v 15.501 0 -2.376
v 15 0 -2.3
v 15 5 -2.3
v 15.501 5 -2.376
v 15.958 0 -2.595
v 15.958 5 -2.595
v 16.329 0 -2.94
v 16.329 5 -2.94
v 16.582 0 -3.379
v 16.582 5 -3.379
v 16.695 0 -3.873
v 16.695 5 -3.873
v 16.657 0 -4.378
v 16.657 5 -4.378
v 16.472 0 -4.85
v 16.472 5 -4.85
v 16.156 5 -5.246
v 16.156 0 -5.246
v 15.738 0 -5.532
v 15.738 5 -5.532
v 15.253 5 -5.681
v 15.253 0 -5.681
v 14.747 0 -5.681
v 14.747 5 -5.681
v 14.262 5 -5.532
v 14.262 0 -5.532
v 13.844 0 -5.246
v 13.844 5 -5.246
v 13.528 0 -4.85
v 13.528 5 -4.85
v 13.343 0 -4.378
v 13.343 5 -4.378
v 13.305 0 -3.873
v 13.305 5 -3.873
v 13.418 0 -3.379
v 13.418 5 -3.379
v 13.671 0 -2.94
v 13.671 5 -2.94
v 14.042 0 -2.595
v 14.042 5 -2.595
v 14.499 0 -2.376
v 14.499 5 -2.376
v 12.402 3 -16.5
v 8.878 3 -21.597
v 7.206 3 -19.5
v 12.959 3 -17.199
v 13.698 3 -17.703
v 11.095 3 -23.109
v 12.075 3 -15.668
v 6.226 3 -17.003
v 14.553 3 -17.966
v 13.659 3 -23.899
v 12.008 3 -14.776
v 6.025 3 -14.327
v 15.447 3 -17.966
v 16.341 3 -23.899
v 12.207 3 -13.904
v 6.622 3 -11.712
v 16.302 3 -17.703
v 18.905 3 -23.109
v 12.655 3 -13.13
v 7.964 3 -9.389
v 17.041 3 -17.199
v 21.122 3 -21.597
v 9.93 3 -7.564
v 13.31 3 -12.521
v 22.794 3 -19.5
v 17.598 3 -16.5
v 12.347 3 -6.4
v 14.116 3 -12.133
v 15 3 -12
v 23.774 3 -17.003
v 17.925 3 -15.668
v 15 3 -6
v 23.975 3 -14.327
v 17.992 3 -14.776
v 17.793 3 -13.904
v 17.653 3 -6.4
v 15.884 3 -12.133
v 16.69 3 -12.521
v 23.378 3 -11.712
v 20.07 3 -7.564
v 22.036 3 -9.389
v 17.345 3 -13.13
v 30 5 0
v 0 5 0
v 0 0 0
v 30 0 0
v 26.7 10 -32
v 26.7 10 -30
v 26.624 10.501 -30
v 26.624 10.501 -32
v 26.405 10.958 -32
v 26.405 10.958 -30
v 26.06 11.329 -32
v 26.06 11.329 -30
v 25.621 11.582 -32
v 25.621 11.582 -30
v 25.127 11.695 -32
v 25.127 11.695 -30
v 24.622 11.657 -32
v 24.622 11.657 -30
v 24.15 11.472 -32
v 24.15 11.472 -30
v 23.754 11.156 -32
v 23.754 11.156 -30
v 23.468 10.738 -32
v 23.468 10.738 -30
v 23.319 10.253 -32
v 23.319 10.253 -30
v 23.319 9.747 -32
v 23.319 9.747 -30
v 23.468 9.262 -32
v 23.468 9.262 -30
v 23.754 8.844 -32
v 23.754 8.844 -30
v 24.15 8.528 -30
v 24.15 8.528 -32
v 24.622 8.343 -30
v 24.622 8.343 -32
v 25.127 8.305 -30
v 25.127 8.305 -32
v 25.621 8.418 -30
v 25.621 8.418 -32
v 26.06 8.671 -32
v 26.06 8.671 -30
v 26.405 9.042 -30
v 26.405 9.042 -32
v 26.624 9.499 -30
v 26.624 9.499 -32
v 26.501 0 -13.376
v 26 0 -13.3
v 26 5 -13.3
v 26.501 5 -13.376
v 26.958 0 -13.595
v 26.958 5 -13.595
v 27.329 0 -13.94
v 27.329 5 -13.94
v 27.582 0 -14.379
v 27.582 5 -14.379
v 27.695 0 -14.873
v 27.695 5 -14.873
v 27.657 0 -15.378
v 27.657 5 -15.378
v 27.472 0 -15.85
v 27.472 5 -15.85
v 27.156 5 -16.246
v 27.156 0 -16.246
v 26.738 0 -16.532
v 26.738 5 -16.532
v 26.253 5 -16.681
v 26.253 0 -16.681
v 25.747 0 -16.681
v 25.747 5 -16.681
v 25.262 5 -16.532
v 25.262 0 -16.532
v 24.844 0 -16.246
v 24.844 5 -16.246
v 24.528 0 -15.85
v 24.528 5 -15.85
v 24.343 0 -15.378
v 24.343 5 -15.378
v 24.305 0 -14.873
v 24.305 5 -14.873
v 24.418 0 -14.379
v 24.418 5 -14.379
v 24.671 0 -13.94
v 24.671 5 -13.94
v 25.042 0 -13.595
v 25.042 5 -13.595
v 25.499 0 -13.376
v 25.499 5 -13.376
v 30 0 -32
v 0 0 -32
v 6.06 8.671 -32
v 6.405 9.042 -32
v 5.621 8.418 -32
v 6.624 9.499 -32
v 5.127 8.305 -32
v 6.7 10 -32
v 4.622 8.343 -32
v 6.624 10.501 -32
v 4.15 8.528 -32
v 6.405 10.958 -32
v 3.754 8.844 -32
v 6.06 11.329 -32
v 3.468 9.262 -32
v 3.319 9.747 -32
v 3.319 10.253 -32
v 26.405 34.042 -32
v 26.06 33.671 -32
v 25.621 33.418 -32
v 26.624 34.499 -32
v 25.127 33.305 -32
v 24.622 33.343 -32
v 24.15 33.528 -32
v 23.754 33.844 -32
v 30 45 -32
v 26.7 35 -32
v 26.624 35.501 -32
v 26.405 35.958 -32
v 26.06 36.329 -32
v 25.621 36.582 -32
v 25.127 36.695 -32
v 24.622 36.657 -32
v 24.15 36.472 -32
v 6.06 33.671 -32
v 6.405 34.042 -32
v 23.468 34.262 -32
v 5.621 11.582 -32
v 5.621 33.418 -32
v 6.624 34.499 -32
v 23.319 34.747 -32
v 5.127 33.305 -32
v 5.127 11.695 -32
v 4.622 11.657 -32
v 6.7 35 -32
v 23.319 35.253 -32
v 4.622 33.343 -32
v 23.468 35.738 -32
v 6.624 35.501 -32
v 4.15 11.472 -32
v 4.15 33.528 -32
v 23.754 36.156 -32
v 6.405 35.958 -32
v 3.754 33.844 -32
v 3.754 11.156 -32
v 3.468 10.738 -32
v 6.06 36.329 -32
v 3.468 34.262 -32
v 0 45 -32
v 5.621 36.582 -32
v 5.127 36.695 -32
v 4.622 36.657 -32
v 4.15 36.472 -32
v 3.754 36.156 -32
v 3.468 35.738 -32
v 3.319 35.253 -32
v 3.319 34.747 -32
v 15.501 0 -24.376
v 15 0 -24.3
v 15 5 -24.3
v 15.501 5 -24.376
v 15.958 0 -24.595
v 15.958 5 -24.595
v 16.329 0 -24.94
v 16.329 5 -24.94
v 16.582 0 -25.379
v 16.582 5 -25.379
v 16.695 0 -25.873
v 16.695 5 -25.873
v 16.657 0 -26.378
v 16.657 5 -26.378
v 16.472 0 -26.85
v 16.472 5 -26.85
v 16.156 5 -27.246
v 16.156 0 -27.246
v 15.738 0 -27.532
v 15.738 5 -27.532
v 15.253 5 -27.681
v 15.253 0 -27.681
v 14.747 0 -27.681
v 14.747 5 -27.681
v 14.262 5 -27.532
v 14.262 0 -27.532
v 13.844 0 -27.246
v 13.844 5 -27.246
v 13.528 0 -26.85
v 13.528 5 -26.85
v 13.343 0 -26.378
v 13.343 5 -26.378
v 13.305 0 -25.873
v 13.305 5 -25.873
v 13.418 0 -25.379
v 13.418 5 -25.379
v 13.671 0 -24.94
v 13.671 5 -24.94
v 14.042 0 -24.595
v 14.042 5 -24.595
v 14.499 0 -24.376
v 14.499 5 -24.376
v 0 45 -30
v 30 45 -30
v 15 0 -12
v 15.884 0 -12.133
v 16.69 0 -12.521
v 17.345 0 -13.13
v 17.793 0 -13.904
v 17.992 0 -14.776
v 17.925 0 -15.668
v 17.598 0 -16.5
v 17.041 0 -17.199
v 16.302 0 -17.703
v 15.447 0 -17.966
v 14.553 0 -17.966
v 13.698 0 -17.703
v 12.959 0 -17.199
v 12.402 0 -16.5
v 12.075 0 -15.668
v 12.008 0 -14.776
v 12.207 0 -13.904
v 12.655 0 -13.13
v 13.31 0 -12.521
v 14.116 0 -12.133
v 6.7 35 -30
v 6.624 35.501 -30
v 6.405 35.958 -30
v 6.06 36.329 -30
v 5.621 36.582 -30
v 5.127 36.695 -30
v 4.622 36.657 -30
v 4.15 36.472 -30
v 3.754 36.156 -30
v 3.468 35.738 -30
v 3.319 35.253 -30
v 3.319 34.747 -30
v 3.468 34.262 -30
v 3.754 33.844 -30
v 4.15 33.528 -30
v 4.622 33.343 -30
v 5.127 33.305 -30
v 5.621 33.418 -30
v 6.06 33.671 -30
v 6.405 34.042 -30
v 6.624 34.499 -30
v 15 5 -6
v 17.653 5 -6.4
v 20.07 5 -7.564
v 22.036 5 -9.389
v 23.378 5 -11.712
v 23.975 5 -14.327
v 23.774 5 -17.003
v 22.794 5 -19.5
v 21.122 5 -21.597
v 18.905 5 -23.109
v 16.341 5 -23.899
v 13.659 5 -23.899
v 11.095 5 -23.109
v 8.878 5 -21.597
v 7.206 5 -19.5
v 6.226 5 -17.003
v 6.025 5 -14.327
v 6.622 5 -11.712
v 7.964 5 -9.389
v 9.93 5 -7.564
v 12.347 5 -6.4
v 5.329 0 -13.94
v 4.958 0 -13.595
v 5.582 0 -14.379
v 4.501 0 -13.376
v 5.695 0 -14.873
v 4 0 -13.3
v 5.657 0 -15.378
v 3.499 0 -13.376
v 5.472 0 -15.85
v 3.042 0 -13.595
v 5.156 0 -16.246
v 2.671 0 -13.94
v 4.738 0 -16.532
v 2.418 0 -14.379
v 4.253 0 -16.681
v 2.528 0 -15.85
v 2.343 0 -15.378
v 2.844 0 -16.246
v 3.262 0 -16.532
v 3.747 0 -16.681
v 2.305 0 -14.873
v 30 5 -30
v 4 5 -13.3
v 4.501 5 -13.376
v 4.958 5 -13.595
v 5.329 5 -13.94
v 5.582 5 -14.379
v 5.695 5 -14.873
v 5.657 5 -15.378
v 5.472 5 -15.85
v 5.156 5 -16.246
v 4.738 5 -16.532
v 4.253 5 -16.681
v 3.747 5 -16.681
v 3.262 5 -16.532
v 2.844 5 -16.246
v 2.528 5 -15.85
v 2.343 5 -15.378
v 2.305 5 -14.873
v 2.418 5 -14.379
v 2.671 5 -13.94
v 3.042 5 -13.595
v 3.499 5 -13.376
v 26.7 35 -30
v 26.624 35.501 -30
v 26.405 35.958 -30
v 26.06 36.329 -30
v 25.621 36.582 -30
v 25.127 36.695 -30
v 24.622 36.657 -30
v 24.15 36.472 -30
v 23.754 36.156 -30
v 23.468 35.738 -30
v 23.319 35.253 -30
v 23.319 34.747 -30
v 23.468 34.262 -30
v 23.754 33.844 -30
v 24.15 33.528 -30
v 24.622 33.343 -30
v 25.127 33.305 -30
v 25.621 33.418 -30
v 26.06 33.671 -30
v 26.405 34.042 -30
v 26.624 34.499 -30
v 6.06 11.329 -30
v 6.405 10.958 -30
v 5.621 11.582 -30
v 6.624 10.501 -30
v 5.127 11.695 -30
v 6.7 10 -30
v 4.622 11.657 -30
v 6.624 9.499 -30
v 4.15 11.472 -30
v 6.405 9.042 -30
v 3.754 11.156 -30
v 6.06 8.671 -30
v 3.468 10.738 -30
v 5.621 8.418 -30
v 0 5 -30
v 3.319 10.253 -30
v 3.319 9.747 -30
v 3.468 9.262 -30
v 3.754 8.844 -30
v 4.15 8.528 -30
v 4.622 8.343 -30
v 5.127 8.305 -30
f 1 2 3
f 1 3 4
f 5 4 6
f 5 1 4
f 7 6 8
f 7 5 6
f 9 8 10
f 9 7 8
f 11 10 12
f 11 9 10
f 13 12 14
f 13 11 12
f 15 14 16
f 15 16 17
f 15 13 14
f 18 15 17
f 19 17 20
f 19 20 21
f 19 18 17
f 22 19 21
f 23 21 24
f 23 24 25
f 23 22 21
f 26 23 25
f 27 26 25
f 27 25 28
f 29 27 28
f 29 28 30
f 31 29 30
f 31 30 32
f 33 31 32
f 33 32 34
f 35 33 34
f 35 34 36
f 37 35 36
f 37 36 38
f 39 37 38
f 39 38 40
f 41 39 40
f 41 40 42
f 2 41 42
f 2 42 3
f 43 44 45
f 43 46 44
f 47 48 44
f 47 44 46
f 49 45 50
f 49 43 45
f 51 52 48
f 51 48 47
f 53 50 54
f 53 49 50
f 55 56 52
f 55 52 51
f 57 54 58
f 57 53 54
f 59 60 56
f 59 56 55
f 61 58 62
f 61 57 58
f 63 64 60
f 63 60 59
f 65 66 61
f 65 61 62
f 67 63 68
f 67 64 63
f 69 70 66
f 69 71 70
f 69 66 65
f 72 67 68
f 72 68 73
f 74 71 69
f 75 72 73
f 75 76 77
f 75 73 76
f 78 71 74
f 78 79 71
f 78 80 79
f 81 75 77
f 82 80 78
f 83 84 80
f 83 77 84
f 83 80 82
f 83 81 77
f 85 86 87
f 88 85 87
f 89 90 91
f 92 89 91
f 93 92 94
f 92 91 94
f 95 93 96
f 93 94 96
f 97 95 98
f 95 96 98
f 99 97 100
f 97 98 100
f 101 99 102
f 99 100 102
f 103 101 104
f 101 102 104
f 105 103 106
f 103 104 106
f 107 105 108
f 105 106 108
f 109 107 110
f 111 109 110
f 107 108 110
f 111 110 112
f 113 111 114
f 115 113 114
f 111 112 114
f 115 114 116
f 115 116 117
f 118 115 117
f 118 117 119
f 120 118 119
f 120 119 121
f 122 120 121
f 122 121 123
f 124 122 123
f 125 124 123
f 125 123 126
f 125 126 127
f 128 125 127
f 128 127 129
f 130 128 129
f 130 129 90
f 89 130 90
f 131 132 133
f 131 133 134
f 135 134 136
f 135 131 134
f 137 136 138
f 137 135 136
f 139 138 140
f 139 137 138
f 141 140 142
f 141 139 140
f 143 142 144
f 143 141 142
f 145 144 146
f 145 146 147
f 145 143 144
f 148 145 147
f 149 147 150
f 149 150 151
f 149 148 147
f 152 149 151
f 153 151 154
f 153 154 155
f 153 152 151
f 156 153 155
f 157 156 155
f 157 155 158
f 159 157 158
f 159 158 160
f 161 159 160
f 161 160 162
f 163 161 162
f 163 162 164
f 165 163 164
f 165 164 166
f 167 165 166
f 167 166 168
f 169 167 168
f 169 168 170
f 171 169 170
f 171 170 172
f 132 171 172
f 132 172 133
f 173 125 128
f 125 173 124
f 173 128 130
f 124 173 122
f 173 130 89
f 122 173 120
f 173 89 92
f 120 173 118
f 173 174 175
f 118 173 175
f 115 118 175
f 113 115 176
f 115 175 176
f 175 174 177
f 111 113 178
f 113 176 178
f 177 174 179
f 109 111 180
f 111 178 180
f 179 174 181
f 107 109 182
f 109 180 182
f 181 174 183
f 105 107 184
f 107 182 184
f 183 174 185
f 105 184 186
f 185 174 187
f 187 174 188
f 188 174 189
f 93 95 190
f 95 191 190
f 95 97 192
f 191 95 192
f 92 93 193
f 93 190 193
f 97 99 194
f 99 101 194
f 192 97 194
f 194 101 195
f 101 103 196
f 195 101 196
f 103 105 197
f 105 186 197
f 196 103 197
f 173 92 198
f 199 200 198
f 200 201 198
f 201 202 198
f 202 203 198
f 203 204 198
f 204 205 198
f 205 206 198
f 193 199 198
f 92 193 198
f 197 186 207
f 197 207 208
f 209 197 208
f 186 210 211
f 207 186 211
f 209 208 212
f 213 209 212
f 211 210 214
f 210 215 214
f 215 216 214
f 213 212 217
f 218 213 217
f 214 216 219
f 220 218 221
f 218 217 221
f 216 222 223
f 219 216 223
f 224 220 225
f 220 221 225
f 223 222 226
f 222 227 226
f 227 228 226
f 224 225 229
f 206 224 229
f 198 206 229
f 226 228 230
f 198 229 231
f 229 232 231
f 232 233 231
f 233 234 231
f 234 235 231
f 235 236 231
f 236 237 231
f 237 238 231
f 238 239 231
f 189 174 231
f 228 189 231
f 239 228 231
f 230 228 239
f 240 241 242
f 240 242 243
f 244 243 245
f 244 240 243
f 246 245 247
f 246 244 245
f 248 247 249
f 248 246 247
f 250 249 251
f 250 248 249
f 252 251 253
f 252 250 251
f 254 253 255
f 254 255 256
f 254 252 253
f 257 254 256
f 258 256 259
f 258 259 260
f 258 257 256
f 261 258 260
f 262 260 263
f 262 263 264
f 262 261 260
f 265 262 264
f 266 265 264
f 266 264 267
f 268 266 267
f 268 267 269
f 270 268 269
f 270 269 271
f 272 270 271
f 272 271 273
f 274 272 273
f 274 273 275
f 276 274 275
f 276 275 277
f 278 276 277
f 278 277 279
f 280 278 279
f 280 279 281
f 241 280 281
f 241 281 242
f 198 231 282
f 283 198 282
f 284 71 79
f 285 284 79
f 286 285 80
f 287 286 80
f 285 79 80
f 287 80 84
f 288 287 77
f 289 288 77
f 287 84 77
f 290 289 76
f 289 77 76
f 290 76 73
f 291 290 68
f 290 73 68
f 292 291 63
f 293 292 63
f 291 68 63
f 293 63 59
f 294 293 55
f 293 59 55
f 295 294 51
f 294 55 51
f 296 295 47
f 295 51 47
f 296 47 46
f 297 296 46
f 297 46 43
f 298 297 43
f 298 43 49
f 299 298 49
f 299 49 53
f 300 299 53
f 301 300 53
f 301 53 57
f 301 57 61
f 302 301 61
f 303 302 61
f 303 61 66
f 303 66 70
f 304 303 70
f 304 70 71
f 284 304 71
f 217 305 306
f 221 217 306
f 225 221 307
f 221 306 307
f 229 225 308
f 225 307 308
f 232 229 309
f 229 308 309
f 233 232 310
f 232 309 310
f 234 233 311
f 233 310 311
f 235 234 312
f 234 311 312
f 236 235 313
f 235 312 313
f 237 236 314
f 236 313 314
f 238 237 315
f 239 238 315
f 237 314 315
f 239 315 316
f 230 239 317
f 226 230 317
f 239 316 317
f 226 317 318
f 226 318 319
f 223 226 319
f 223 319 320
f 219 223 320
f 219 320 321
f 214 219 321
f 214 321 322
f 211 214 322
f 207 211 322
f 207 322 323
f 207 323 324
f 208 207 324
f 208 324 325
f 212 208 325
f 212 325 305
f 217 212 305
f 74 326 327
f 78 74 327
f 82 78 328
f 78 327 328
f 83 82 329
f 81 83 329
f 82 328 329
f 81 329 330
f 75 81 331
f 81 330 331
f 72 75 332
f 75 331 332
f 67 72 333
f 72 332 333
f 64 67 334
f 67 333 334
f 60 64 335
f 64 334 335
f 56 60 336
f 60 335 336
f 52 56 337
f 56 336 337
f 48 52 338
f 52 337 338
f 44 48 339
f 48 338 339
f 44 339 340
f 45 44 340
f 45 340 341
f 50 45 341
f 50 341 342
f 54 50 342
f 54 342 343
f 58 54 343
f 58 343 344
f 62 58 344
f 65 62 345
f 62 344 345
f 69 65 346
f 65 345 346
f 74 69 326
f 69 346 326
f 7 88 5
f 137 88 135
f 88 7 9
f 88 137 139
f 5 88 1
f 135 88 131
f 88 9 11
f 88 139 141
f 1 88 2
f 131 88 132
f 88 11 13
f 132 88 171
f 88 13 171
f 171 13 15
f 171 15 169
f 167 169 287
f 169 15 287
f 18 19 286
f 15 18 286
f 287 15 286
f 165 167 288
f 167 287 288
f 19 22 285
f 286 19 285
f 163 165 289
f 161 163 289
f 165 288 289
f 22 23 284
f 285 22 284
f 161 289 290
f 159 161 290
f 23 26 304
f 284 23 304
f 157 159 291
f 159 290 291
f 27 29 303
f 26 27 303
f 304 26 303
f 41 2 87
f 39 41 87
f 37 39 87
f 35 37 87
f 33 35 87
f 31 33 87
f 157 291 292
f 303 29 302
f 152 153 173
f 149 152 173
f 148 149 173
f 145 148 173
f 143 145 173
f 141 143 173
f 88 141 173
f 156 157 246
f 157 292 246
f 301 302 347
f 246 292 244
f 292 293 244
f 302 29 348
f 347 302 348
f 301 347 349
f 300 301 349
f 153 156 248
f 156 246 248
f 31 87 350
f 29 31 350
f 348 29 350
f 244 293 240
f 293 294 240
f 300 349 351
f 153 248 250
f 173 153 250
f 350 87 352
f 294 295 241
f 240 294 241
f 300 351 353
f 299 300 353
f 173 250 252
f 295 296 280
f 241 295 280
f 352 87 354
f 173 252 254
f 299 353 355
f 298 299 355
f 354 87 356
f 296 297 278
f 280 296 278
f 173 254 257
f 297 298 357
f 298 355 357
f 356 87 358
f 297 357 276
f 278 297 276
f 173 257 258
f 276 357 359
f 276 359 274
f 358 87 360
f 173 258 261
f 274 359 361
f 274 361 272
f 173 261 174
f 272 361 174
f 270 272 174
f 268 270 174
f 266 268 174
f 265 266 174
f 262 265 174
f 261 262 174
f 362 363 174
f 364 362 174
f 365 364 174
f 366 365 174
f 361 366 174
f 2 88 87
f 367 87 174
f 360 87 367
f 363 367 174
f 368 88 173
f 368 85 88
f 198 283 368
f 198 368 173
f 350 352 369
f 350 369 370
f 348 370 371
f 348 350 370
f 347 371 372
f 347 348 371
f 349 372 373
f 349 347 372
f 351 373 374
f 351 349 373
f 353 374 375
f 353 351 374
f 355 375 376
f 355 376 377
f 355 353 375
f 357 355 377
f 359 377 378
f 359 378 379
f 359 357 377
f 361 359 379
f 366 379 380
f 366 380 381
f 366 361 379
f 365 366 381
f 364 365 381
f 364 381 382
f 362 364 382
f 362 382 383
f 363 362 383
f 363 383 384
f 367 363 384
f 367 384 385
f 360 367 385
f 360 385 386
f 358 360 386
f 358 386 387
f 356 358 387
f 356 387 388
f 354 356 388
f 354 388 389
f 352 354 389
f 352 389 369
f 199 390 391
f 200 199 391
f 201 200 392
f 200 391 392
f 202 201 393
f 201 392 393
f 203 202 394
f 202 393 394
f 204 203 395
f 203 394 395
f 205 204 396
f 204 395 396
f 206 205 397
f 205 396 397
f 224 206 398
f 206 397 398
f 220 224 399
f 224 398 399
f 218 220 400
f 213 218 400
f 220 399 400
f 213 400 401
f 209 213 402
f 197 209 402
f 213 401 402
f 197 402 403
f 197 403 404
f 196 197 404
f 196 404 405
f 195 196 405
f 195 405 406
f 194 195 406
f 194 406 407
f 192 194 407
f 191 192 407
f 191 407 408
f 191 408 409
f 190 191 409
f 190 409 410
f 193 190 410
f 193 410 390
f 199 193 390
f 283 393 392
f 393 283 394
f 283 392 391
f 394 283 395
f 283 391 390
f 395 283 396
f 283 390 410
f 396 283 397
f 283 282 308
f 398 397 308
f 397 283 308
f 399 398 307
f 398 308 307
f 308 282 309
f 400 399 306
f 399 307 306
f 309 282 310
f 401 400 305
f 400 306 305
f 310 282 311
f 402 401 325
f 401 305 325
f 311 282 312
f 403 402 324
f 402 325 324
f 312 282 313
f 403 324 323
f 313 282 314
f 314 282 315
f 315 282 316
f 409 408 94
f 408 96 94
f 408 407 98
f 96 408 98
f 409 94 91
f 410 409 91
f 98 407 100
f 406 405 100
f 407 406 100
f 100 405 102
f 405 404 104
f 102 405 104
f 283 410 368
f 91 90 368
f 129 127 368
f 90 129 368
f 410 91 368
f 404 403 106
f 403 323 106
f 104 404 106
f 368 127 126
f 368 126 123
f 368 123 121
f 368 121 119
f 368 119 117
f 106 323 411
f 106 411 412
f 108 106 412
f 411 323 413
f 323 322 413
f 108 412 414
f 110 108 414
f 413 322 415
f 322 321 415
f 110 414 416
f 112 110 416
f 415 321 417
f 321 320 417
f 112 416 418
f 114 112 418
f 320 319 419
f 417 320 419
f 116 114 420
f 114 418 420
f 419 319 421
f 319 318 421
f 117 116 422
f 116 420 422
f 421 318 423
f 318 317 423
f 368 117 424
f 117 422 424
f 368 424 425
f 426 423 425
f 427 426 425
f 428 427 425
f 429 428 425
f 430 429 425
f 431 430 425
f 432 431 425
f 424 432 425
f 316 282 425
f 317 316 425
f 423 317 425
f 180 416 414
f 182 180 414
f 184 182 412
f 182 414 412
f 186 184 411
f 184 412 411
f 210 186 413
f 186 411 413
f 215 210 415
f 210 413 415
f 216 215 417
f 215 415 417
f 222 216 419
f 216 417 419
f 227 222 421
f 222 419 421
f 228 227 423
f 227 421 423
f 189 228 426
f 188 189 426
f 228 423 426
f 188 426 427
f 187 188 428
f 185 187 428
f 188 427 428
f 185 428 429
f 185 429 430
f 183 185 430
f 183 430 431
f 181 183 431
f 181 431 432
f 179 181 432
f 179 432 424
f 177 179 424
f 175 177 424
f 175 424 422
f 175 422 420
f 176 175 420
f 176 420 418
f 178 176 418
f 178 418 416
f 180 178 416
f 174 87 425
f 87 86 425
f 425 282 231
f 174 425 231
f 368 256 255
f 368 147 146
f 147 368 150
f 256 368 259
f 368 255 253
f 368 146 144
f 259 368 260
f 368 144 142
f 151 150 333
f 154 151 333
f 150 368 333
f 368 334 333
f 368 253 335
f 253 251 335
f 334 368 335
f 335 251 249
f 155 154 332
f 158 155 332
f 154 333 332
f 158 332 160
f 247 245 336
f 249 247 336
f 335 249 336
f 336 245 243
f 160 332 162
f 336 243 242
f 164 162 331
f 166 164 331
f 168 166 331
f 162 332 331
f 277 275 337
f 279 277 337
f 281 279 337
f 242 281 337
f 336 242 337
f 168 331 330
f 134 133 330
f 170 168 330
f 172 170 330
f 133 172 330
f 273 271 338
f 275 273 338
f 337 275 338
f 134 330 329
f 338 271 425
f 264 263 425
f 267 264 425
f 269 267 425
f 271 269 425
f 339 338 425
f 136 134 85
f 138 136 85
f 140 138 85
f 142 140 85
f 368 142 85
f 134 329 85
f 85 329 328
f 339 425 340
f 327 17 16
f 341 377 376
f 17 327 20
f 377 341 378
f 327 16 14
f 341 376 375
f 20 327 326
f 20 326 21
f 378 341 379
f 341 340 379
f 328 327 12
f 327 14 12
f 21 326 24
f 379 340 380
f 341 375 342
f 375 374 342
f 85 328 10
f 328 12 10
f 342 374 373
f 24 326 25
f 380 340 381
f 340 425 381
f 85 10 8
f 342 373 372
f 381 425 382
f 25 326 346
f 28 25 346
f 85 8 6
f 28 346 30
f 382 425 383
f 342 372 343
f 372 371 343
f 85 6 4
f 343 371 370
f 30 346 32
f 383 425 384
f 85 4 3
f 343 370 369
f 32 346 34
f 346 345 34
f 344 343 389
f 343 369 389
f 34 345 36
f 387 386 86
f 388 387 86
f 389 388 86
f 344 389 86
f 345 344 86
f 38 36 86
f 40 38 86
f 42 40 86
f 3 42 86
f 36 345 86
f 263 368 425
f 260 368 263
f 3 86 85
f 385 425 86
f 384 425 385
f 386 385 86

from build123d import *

# Parameters (mm, degrees)
BOSS_EXTRUDE1_DEPTH     = 30
SKETCH3_R               = 9
SKETCH3_R_2             = 3
CUT_EXTRUDE1_DEPTH      = 2
SKETCH7_R               = 3
CUT_EXTRUDE2_DEPTH      = 60.363288319
CUT_EXTRUDE3_DEPTH      = 2
CUT_EXTRUDE3_DEPTH_BACK = 61.728905803
SKETCH8_R               = 1.7
SKETCH9_R               = 1.7
CUT_EXTRUDE4_DEPTH      = 62.846584384


with BuildPart() as part:
    # Sketch2 → Boss-Extrude1 (new body)
    with BuildSketch(Plane(origin=(0, 0, 0), x_dir=(0, 0, -1), z_dir=(1, 0, 0))):
        Polygon((0, 0), (32, 0), (32, 45), (30, 45), (30, 5), (0, 5), align=None)
    extrude(amount=BOSS_EXTRUDE1_DEPTH)

    # Sketch3 → Cut-Extrude1 (cut)
    with BuildSketch(Plane(origin=(0, 5, 0), x_dir=(1, 0, 0), z_dir=(0, 1, 0))):
        with Locations(Location((15, 15, 0), (0, 0, 270))):
            Circle(SKETCH3_R)
        with Locations(Location((15, 15, 0), (0, 0, 270))):
            Circle(SKETCH3_R_2, mode=Mode.SUBTRACT)
    extrude(amount=-CUT_EXTRUDE1_DEPTH, mode=Mode.SUBTRACT)

    # Sketch7 → Cut-Extrude2 (cut, through all)
    with BuildSketch(Plane(origin=(0, 5, 0), x_dir=(1, 0, 0), z_dir=(0, 1, 0))):
        with Locations(Location((15, 15, 0), (0, 0, 270))):
            Circle(SKETCH7_R)
    extrude(amount=-CUT_EXTRUDE2_DEPTH, mode=Mode.SUBTRACT)

    # Sketch8 → Cut-Extrude3 (cut, two sides: drawn at the far end of the back side and taken through both)
    with BuildSketch(Plane(origin=(0, 3, 0), x_dir=(1, 0, 0), z_dir=(0, 1, 0)).offset(-CUT_EXTRUDE3_DEPTH_BACK)):
        with Locations(Location((4, 15, 0), (0, 0, 270))):
            Circle(SKETCH8_R)
        with Locations(Location((26, 15, 0), (0, 0, 270))):
            Circle(SKETCH8_R)
        with Locations(Location((15, 4, 0), (0, 0, 270))):
            Circle(SKETCH8_R)
        with Locations(Location((15, 26, 0), (0, 0, 270))):
            Circle(SKETCH8_R)
    extrude(amount=CUT_EXTRUDE3_DEPTH + CUT_EXTRUDE3_DEPTH_BACK, mode=Mode.SUBTRACT)

    # Sketch9 → Cut-Extrude4 (cut, through all)
    with BuildSketch(Plane.XY.offset(-30)):
        with Locations((5, 35)):
            Circle(SKETCH9_R)
        with Locations((25, 35)):
            Circle(SKETCH9_R)
        with Locations((25, 10)):
            Circle(SKETCH9_R)
        with Locations((5, 10)):
            Circle(SKETCH9_R)
    extrude(amount=-CUT_EXTRUDE4_DEPTH, mode=Mode.SUBTRACT)


solid = part.part
